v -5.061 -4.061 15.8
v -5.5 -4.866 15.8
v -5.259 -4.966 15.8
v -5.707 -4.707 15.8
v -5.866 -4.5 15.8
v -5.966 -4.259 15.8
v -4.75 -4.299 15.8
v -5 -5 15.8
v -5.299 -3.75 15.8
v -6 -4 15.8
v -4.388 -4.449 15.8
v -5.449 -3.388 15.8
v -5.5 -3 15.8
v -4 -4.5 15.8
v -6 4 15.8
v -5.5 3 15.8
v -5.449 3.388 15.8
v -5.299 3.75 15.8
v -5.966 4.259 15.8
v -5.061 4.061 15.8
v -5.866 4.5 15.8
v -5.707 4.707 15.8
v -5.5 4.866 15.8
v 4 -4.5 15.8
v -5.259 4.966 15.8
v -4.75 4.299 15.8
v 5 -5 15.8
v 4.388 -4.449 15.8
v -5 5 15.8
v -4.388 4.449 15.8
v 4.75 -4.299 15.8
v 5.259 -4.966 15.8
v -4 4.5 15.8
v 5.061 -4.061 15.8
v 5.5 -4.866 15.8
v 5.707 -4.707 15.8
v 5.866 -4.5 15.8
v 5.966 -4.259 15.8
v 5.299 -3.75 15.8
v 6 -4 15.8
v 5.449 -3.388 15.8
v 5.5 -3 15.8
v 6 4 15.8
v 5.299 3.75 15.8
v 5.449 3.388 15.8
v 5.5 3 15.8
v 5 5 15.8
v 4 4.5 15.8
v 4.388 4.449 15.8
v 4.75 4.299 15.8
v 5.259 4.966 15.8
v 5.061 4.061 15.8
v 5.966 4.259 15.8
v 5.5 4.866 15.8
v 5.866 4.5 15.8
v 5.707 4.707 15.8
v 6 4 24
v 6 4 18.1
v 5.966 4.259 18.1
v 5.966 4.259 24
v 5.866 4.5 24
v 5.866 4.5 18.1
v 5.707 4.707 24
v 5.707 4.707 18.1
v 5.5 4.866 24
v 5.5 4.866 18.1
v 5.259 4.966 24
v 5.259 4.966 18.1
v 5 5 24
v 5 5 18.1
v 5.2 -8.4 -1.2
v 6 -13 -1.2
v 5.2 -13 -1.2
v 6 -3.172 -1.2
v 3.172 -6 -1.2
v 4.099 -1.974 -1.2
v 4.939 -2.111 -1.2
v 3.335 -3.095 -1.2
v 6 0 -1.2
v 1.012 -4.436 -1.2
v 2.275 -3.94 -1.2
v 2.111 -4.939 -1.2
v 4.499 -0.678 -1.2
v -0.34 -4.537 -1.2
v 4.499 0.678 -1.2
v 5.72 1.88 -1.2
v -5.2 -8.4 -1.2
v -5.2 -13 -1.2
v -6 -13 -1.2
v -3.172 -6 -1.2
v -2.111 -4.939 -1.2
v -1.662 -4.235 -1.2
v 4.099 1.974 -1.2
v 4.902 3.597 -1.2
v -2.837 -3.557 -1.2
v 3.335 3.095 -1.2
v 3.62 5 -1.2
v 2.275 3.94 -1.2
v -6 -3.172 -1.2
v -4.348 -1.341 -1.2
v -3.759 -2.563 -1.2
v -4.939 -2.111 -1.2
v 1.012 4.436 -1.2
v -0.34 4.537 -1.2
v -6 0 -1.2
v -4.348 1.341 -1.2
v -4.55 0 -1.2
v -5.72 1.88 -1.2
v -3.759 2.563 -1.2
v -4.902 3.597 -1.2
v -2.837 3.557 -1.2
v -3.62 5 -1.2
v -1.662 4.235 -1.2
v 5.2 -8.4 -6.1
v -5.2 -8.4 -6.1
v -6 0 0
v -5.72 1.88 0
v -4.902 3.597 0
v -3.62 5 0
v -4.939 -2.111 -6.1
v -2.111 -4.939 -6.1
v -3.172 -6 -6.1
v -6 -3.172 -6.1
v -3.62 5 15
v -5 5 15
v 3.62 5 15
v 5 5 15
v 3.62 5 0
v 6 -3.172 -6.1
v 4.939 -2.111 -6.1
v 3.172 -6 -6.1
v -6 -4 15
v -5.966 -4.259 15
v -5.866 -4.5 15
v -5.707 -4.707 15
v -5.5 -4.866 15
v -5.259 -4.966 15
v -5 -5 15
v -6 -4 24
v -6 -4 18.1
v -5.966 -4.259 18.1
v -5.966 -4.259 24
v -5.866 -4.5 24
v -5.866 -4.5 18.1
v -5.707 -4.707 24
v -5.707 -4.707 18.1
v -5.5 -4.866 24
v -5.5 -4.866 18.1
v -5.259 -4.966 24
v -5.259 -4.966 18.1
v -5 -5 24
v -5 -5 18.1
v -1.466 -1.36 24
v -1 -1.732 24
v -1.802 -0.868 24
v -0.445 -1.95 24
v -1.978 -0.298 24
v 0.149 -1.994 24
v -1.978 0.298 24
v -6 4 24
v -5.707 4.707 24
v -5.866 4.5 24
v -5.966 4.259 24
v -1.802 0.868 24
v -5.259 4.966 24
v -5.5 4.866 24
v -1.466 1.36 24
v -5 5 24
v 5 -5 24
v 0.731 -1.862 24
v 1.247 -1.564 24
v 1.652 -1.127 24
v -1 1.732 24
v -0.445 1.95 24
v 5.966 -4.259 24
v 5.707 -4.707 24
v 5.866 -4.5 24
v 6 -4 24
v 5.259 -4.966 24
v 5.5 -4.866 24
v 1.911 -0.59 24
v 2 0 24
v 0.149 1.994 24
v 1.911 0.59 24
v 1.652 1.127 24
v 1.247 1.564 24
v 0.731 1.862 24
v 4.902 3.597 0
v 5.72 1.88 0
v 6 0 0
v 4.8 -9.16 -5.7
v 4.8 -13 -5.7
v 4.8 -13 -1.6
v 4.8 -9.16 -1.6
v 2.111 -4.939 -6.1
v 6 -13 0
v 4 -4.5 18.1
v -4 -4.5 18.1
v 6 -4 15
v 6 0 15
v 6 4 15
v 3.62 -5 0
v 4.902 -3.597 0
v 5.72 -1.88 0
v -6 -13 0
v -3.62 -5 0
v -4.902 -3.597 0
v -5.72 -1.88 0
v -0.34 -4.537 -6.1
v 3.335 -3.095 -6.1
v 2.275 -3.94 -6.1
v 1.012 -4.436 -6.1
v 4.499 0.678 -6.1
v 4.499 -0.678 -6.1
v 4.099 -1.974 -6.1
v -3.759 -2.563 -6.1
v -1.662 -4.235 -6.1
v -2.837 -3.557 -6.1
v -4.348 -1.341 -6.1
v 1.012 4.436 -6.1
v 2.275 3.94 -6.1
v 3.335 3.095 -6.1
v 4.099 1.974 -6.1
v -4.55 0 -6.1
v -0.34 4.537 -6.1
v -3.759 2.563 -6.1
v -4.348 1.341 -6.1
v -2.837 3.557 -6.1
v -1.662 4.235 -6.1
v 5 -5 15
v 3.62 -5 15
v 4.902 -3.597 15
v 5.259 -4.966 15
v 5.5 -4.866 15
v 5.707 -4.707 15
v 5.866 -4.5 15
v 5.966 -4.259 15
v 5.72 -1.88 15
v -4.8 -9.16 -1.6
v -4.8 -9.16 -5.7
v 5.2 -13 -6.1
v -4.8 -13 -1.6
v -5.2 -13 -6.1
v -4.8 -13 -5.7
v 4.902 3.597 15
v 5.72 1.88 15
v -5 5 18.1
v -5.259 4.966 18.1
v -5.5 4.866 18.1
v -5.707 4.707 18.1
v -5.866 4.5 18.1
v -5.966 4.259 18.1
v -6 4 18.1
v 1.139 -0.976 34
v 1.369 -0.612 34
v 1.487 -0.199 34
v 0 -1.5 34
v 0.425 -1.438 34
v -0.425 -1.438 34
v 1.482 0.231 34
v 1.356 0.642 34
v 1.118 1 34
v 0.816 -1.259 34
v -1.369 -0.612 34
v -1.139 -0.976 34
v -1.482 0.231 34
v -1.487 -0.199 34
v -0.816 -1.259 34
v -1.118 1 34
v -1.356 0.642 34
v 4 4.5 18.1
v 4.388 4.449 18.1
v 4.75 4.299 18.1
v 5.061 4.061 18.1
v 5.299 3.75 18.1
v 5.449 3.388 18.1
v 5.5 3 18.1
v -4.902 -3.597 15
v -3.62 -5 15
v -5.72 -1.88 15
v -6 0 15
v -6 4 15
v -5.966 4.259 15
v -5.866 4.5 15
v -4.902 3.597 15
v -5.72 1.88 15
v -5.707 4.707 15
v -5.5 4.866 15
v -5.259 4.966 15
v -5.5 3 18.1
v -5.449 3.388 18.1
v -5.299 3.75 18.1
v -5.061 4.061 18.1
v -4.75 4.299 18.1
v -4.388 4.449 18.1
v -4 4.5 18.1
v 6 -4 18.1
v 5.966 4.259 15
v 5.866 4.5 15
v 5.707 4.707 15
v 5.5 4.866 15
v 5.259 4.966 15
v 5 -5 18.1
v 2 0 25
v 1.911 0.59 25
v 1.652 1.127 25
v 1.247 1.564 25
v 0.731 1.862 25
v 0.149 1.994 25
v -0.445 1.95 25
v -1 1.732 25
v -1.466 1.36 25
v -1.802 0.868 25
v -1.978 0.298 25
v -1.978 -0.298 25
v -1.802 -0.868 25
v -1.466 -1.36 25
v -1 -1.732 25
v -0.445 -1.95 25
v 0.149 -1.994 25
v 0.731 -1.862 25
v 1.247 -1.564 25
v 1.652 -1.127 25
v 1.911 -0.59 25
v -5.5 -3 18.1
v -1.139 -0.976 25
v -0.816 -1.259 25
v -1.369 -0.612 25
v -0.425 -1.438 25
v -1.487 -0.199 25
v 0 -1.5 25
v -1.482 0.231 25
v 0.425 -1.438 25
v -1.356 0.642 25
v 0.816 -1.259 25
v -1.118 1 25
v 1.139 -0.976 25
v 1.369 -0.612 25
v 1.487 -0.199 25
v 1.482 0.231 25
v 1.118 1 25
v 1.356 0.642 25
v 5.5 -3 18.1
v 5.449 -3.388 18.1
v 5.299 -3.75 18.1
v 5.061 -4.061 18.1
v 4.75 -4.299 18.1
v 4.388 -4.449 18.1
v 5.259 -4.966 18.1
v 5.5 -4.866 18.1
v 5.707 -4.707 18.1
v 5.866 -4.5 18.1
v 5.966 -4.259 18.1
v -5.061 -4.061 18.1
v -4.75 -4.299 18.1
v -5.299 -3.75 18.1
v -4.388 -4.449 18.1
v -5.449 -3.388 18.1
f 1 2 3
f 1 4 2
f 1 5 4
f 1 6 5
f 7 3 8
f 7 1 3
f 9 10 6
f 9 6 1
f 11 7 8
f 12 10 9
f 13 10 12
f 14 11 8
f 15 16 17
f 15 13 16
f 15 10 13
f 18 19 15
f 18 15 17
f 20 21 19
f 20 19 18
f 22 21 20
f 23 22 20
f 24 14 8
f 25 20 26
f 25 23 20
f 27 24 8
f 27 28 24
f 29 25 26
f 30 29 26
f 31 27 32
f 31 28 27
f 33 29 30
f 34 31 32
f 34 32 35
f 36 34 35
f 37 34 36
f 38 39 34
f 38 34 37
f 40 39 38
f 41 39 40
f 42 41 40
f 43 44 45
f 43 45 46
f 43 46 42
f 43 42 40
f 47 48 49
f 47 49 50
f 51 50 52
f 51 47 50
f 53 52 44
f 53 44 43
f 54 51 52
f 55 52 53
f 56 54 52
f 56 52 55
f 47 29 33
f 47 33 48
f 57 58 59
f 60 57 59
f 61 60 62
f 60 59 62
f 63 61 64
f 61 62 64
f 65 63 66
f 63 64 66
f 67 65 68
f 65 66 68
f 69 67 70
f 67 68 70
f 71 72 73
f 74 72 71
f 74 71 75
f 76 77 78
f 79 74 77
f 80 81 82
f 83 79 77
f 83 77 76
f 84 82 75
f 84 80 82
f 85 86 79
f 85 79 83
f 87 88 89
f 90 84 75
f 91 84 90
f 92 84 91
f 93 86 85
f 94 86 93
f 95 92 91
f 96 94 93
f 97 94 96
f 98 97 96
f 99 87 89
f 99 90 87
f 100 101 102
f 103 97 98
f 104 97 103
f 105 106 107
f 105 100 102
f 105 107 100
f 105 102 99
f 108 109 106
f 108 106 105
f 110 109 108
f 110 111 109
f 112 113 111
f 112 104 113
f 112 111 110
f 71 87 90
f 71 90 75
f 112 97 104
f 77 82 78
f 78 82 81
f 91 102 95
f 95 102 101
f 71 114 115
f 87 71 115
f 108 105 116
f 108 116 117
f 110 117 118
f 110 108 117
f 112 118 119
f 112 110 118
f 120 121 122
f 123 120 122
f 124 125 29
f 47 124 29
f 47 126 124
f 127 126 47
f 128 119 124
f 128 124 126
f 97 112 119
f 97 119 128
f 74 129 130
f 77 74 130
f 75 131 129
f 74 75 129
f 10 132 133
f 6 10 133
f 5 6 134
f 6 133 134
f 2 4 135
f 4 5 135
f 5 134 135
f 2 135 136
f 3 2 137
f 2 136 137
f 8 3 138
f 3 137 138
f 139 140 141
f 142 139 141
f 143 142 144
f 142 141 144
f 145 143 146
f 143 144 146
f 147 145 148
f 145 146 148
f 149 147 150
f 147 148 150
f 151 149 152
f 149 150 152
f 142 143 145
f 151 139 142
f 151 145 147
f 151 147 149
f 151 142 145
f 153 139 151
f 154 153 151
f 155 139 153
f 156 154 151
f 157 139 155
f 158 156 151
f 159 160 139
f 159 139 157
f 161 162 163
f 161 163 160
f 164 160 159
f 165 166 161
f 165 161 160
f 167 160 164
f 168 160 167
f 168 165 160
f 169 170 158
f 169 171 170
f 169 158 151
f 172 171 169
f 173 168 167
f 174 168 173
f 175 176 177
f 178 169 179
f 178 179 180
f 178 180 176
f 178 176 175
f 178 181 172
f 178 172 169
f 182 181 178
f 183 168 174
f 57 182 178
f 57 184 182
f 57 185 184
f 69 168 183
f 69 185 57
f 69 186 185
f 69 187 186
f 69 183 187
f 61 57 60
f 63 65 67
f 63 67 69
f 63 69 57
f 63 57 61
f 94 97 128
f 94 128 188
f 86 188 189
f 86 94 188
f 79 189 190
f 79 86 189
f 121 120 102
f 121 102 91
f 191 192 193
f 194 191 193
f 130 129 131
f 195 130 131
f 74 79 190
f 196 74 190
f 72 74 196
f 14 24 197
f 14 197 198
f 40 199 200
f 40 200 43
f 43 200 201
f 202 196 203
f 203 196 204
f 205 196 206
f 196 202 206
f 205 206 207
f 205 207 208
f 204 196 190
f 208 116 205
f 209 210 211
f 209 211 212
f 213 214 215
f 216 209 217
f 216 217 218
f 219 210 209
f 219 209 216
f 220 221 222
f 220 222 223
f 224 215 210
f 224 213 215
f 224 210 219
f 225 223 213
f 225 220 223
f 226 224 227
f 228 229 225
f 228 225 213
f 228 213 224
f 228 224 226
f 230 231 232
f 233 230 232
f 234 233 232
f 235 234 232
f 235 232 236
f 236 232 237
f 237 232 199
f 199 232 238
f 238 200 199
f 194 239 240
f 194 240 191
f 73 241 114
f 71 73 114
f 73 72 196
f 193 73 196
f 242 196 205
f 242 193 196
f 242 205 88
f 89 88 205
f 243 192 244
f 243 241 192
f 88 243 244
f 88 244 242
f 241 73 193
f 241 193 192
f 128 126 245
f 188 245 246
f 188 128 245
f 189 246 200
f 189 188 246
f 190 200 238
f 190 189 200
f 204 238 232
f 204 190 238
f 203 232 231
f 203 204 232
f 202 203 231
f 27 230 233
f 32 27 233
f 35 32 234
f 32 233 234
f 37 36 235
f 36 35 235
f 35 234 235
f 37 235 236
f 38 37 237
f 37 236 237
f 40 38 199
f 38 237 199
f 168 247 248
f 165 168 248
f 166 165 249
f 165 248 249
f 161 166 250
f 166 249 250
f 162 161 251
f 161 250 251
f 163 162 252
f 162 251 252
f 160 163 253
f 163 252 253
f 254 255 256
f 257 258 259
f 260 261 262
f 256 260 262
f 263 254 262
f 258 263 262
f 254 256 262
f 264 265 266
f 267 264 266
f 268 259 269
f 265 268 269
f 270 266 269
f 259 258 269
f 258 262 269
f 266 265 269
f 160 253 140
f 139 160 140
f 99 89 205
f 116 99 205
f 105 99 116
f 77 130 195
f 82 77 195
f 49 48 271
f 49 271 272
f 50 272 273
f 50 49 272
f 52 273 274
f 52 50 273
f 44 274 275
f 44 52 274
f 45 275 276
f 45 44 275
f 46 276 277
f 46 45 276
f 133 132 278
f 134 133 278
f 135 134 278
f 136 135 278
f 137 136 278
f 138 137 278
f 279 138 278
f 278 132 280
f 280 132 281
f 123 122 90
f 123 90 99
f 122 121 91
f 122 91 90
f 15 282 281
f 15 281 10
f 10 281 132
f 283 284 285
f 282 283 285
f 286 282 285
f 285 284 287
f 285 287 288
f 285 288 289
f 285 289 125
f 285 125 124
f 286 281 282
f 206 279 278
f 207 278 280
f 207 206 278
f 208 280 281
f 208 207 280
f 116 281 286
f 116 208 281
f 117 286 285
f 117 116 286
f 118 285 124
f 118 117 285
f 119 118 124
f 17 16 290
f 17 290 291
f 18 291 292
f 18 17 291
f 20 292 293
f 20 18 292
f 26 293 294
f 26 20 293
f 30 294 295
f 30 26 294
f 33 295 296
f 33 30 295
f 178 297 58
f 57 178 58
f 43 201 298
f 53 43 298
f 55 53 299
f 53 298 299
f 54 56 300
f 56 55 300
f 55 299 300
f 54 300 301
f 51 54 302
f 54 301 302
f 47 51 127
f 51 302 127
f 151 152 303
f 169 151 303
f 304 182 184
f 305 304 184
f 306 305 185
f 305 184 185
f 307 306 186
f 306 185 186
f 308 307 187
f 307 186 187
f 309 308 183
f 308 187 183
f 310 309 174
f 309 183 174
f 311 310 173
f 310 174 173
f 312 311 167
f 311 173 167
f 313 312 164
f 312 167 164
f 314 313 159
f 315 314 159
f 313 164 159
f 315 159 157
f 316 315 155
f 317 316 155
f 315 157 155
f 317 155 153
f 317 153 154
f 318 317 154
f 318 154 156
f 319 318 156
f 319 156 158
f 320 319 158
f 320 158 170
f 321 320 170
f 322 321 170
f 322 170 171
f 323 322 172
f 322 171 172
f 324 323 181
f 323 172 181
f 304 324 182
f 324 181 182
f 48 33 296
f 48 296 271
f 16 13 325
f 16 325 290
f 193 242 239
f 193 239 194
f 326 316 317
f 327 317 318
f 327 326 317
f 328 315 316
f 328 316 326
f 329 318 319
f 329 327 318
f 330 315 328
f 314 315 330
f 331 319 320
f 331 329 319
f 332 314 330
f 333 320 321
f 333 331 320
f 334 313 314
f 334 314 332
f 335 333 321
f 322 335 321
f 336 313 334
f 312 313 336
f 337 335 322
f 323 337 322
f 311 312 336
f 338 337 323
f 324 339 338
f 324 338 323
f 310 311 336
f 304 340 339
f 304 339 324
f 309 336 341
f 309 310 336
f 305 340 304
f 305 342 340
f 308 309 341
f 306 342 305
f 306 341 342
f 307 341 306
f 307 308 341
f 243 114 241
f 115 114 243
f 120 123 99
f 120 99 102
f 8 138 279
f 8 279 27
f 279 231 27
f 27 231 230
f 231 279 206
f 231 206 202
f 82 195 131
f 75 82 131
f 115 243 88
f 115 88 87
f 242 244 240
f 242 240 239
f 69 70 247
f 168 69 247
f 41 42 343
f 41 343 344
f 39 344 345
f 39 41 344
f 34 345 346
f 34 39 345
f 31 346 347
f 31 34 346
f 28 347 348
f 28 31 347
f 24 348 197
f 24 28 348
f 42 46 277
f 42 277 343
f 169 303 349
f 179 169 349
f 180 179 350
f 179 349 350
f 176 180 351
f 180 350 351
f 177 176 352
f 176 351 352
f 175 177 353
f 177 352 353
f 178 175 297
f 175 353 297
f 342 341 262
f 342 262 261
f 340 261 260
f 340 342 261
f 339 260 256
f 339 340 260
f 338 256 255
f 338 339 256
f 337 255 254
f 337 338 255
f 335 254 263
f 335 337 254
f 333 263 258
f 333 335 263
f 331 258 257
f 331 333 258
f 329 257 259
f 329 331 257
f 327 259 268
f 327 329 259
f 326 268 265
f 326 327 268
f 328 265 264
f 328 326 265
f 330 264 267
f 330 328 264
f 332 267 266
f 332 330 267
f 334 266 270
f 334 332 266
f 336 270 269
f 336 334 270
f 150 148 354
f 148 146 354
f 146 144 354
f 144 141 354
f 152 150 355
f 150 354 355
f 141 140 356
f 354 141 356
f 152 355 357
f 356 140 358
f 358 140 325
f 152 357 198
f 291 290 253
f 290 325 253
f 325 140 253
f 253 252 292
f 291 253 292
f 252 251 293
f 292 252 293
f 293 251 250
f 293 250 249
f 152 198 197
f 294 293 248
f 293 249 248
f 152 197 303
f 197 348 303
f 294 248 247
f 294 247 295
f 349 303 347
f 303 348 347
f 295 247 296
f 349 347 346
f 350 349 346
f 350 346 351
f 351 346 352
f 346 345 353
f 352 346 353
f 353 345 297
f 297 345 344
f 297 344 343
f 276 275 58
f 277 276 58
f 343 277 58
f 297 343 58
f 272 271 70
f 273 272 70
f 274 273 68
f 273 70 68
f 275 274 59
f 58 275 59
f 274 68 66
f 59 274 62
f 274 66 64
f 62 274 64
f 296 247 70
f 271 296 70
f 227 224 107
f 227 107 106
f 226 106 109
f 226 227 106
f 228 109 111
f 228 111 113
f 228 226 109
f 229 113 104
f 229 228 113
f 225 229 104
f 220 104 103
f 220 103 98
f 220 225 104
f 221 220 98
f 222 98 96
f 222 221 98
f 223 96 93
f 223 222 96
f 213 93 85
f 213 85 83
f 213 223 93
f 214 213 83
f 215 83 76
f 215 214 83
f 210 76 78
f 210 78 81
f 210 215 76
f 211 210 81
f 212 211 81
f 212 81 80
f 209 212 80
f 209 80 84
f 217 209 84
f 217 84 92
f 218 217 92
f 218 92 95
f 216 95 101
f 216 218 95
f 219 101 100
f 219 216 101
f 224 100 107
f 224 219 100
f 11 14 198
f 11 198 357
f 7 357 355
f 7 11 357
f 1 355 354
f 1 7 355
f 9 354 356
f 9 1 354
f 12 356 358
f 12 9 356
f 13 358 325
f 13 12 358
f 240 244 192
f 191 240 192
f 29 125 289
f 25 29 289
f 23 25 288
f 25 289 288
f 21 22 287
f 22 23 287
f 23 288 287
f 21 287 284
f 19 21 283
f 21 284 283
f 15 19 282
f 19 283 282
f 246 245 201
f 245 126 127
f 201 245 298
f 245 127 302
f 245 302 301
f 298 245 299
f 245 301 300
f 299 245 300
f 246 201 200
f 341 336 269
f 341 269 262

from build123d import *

# Parameters (mm, degrees)
MOTOR_DEPTH           = 15
GEARBOX_DEPTH         = 9
CUT_EXTRUDE1_START    = 0.8
SKETCH6_OUTSIDE_W     = 19.728
SKETCH6_OUTSIDE_H     = 17.728
CUT_EXTRUDE1_DEPTH    = 2.3
SKETCH5_R             = 2
GEARBOX_BEARING_DEPTH = 1
SHAFT_START           = 1
SHAFT_DEPTH           = 9
ENCODER_BASE_START    = -6.1
ENCODER_BASE_DEPTH    = 6.1
SKETCH7_OUTSIDE_W     = 23.112
SKETCH7_OUTSIDE_H     = 29.112
SKETCH7_OUTSIDE_R     = 4.55
SKETCH7_OUTSIDE_W_2   = 10.4
SKETCH7_OUTSIDE_H_2   = 4.6
CUT_EXTRUDE3_DEPTH    = 4.9
SKETCH8_W             = 9.6
SKETCH8_H             = 4.1
CUT_EXTRUDE4_DEPTH    = 3.84


with BuildPart() as part:
    # Sketch1 → motor (new body)
    with BuildSketch(Plane.XY):
        with BuildLine():
            Line((-3.62, 5), (3.62, 5))
            ThreePointArc((3.62, 5), (6, 0), (3.62, -5))
            Line((3.62, -5), (-3.62, -5))
            ThreePointArc((-3.62, -5), (-6, 0), (-3.62, 5))
        make_face()
    extrude(amount=MOTOR_DEPTH)

    # Sketch3 → gearbox (add)
    with BuildSketch(Plane.XY.offset(15)):
        with BuildLine():
            Line((-5, -5), (5, -5))
            ThreePointArc((5, -5), (5.707106781, -4.707106781), (6, -4))
            Line((6, -4), (6, 4))
            ThreePointArc((6, 4), (5.707106781, 4.707106781), (5, 5))
            Line((5, 5), (-5, 5))
            ThreePointArc((-5, 5), (-5.707106781, 4.707106781), (-6, 4))
            Line((-6, 4), (-6, -4))
            ThreePointArc((-6, -4), (-5.707106781, -4.707106781), (-5, -5))
        make_face()
    extrude(amount=GEARBOX_DEPTH)

    # Sketch6 outside → Cut-Extrude1 (cut)
    with BuildSketch(Plane.XY.offset(15).offset(CUT_EXTRUDE1_START)):
        Rectangle(SKETCH6_OUTSIDE_W, SKETCH6_OUTSIDE_H)
        with BuildLine():
            Line((-4, 4.5), (4, 4.5))
            ThreePointArc((4, 4.5), (5.060660172, 4.060660172), (5.5, 3))
            Line((5.5, 3), (5.5, -3))
            ThreePointArc((5.5, -3), (5.060660172, -4.060660172), (4, -4.5))
            Line((4, -4.5), (-4, -4.5))
            ThreePointArc((-4, -4.5), (-5.060660172, -4.060660172), (-5.5, -3))
            Line((-5.5, -3), (-5.5, 3))
            ThreePointArc((-5.5, 3), (-5.060660172, 4.060660172), (-4, 4.5))
        make_face(mode=Mode.SUBTRACT)
    extrude(amount=CUT_EXTRUDE1_DEPTH, mode=Mode.SUBTRACT)

    # Sketch5 → gearbox-bearing (add)
    with BuildSketch(Plane.XY.offset(24)):
        Circle(SKETCH5_R)
    extrude(amount=GEARBOX_BEARING_DEPTH)

    # Sketch4 → shaft (add)
    with BuildSketch(Plane.XY.offset(24).offset(SHAFT_START)):
        with BuildLine():
            Line((-1.118033989, 1), (1.118033989, 1))
            ThreePointArc((1.118033989, 1), (0, -1.5), (-1.118033989, 1))
        make_face()
    extrude(amount=SHAFT_DEPTH)

    # Sketch2 → encoder-base (add)
    with BuildSketch(Plane.XY.offset(ENCODER_BASE_START)):
        with BuildLine():
            Line((6, 0), (6, -13))
            Line((6, -13), (-6, -13))
            Line((-6, -13), (-6, 0))
            ThreePointArc((-6, 0), (-5.37464767, 2.768772291), (-3.62, 5))
            Line((-3.62, 5), (3.62, 5))
            ThreePointArc((3.62, 5), (5.37464767, 2.768772291), (6, 0))
        make_face()
    extrude(amount=ENCODER_BASE_DEPTH)

    # Sketch7 outside → Cut-Extrude3 (cut)
    with BuildSketch(Plane(origin=(0, 0, -6.1), x_dir=(-1, 0, 0), z_dir=(0, 0, -1))):
        with Locations((0, -4)):
            Rectangle(SKETCH7_OUTSIDE_W, SKETCH7_OUTSIDE_H)
        Circle(SKETCH7_OUTSIDE_R, mode=Mode.SUBTRACT)
        Polygon((4.939339828, -2.110912703), (2.110912703, -4.939339828), (3.171572875, -6), (6, -3.171572875), align=None, mode=Mode.SUBTRACT)
        Polygon((-2.110912703, -4.939339828), (-3.171572875, -6), (-6, -3.171572875), (-4.939339828, -2.110912703), align=None, mode=Mode.SUBTRACT)
        with Locations((0, -10.7)):
            Rectangle(SKETCH7_OUTSIDE_W_2, SKETCH7_OUTSIDE_H_2, mode=Mode.SUBTRACT)
    extrude(amount=-CUT_EXTRUDE3_DEPTH, mode=Mode.SUBTRACT)

    # Sketch8 → Cut-Extrude4 (cut)
    with BuildSketch(Plane.XZ.offset(13)):
        with Locations((0, -3.65)):
            Rectangle(SKETCH8_W, SKETCH8_H)
    extrude(amount=-CUT_EXTRUDE4_DEPTH, mode=Mode.SUBTRACT)


solid = part.part
